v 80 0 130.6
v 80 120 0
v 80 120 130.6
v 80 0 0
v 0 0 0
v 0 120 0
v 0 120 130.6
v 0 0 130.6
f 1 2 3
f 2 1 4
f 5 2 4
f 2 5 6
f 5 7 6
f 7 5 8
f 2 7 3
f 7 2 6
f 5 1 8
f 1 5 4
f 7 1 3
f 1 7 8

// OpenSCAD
// Architectural thermal visualization; dimensions are scaled.
color([0.8627,0,0.1373,0.75]) translate([0,0,0.00000]) cube([80.00000,120.00000,18.00000]);
color([0.9912,0,0.0088,0.75]) translate([0,0,18.00000]) cube([80.00000,120.00000,10.00000]);
color([1.0000,0,0.0000,0.75]) translate([0,0,28.00000]) cube([80.00000,120.00000,10.00000]);
color([0.9462,0,0.0538,0.75]) translate([0,0,38.00000]) cube([80.00000,120.00000,1.50000]);
color([0.8999,0,0.1001,0.75]) translate([0,0,39.50000]) cube([80.00000,120.00000,3.20000]);
color([0.8583,0,0.1417,0.75]) translate([0,0,42.70000]) cube([80.00000,120.00000,1.50000]);
color([0.8166,0,0.1834,0.75]) translate([0,0,44.20000]) cube([80.00000,120.00000,3.20000]);
color([0.7786,0,0.2214,0.75]) translate([0,0,47.40000]) cube([80.00000,120.00000,1.50000]);
color([0.7406,0,0.2594,0.75]) translate([0,0,48.90000]) cube([80.00000,120.00000,3.20000]);
color([0.7055,0,0.2945,0.75]) translate([0,0,52.10000]) cube([80.00000,120.00000,1.50000]);
color([0.6705,0,0.3295,0.75]) translate([0,0,53.60000]) cube([80.00000,120.00000,3.20000]);
color([0.6378,0,0.3622,0.75]) translate([0,0,56.80000]) cube([80.00000,120.00000,1.50000]);
color([0.6051,0,0.3949,0.75]) translate([0,0,58.30000]) cube([80.00000,120.00000,3.20000]);
color([0.5744,0,0.4256,0.75]) translate([0,0,61.50000]) cube([80.00000,120.00000,1.50000]);
color([0.5436,0,0.4564,0.75]) translate([0,0,63.00000]) cube([80.00000,120.00000,3.20000]);
color([0.5143,0,0.4857,0.75]) translate([0,0,66.20000]) cube([80.00000,120.00000,1.50000]);
color([0.4851,0,0.5149,0.75]) translate([0,0,67.70000]) cube([80.00000,120.00000,3.20000]);
color([0.4571,0,0.5429,0.75]) translate([0,0,70.90000]) cube([80.00000,120.00000,1.50000]);
color([0.4291,0,0.5709,0.75]) translate([0,0,72.40000]) cube([80.00000,120.00000,3.20000]);
color([0.3231,0,0.6769,0.75]) translate([0,0,75.60000]) cube([80.00000,120.00000,5.00000]);
color([0.2344,0,0.7656,0.75]) translate([0,0,80.60000]) cube([80.00000,120.00000,50.00000]);
